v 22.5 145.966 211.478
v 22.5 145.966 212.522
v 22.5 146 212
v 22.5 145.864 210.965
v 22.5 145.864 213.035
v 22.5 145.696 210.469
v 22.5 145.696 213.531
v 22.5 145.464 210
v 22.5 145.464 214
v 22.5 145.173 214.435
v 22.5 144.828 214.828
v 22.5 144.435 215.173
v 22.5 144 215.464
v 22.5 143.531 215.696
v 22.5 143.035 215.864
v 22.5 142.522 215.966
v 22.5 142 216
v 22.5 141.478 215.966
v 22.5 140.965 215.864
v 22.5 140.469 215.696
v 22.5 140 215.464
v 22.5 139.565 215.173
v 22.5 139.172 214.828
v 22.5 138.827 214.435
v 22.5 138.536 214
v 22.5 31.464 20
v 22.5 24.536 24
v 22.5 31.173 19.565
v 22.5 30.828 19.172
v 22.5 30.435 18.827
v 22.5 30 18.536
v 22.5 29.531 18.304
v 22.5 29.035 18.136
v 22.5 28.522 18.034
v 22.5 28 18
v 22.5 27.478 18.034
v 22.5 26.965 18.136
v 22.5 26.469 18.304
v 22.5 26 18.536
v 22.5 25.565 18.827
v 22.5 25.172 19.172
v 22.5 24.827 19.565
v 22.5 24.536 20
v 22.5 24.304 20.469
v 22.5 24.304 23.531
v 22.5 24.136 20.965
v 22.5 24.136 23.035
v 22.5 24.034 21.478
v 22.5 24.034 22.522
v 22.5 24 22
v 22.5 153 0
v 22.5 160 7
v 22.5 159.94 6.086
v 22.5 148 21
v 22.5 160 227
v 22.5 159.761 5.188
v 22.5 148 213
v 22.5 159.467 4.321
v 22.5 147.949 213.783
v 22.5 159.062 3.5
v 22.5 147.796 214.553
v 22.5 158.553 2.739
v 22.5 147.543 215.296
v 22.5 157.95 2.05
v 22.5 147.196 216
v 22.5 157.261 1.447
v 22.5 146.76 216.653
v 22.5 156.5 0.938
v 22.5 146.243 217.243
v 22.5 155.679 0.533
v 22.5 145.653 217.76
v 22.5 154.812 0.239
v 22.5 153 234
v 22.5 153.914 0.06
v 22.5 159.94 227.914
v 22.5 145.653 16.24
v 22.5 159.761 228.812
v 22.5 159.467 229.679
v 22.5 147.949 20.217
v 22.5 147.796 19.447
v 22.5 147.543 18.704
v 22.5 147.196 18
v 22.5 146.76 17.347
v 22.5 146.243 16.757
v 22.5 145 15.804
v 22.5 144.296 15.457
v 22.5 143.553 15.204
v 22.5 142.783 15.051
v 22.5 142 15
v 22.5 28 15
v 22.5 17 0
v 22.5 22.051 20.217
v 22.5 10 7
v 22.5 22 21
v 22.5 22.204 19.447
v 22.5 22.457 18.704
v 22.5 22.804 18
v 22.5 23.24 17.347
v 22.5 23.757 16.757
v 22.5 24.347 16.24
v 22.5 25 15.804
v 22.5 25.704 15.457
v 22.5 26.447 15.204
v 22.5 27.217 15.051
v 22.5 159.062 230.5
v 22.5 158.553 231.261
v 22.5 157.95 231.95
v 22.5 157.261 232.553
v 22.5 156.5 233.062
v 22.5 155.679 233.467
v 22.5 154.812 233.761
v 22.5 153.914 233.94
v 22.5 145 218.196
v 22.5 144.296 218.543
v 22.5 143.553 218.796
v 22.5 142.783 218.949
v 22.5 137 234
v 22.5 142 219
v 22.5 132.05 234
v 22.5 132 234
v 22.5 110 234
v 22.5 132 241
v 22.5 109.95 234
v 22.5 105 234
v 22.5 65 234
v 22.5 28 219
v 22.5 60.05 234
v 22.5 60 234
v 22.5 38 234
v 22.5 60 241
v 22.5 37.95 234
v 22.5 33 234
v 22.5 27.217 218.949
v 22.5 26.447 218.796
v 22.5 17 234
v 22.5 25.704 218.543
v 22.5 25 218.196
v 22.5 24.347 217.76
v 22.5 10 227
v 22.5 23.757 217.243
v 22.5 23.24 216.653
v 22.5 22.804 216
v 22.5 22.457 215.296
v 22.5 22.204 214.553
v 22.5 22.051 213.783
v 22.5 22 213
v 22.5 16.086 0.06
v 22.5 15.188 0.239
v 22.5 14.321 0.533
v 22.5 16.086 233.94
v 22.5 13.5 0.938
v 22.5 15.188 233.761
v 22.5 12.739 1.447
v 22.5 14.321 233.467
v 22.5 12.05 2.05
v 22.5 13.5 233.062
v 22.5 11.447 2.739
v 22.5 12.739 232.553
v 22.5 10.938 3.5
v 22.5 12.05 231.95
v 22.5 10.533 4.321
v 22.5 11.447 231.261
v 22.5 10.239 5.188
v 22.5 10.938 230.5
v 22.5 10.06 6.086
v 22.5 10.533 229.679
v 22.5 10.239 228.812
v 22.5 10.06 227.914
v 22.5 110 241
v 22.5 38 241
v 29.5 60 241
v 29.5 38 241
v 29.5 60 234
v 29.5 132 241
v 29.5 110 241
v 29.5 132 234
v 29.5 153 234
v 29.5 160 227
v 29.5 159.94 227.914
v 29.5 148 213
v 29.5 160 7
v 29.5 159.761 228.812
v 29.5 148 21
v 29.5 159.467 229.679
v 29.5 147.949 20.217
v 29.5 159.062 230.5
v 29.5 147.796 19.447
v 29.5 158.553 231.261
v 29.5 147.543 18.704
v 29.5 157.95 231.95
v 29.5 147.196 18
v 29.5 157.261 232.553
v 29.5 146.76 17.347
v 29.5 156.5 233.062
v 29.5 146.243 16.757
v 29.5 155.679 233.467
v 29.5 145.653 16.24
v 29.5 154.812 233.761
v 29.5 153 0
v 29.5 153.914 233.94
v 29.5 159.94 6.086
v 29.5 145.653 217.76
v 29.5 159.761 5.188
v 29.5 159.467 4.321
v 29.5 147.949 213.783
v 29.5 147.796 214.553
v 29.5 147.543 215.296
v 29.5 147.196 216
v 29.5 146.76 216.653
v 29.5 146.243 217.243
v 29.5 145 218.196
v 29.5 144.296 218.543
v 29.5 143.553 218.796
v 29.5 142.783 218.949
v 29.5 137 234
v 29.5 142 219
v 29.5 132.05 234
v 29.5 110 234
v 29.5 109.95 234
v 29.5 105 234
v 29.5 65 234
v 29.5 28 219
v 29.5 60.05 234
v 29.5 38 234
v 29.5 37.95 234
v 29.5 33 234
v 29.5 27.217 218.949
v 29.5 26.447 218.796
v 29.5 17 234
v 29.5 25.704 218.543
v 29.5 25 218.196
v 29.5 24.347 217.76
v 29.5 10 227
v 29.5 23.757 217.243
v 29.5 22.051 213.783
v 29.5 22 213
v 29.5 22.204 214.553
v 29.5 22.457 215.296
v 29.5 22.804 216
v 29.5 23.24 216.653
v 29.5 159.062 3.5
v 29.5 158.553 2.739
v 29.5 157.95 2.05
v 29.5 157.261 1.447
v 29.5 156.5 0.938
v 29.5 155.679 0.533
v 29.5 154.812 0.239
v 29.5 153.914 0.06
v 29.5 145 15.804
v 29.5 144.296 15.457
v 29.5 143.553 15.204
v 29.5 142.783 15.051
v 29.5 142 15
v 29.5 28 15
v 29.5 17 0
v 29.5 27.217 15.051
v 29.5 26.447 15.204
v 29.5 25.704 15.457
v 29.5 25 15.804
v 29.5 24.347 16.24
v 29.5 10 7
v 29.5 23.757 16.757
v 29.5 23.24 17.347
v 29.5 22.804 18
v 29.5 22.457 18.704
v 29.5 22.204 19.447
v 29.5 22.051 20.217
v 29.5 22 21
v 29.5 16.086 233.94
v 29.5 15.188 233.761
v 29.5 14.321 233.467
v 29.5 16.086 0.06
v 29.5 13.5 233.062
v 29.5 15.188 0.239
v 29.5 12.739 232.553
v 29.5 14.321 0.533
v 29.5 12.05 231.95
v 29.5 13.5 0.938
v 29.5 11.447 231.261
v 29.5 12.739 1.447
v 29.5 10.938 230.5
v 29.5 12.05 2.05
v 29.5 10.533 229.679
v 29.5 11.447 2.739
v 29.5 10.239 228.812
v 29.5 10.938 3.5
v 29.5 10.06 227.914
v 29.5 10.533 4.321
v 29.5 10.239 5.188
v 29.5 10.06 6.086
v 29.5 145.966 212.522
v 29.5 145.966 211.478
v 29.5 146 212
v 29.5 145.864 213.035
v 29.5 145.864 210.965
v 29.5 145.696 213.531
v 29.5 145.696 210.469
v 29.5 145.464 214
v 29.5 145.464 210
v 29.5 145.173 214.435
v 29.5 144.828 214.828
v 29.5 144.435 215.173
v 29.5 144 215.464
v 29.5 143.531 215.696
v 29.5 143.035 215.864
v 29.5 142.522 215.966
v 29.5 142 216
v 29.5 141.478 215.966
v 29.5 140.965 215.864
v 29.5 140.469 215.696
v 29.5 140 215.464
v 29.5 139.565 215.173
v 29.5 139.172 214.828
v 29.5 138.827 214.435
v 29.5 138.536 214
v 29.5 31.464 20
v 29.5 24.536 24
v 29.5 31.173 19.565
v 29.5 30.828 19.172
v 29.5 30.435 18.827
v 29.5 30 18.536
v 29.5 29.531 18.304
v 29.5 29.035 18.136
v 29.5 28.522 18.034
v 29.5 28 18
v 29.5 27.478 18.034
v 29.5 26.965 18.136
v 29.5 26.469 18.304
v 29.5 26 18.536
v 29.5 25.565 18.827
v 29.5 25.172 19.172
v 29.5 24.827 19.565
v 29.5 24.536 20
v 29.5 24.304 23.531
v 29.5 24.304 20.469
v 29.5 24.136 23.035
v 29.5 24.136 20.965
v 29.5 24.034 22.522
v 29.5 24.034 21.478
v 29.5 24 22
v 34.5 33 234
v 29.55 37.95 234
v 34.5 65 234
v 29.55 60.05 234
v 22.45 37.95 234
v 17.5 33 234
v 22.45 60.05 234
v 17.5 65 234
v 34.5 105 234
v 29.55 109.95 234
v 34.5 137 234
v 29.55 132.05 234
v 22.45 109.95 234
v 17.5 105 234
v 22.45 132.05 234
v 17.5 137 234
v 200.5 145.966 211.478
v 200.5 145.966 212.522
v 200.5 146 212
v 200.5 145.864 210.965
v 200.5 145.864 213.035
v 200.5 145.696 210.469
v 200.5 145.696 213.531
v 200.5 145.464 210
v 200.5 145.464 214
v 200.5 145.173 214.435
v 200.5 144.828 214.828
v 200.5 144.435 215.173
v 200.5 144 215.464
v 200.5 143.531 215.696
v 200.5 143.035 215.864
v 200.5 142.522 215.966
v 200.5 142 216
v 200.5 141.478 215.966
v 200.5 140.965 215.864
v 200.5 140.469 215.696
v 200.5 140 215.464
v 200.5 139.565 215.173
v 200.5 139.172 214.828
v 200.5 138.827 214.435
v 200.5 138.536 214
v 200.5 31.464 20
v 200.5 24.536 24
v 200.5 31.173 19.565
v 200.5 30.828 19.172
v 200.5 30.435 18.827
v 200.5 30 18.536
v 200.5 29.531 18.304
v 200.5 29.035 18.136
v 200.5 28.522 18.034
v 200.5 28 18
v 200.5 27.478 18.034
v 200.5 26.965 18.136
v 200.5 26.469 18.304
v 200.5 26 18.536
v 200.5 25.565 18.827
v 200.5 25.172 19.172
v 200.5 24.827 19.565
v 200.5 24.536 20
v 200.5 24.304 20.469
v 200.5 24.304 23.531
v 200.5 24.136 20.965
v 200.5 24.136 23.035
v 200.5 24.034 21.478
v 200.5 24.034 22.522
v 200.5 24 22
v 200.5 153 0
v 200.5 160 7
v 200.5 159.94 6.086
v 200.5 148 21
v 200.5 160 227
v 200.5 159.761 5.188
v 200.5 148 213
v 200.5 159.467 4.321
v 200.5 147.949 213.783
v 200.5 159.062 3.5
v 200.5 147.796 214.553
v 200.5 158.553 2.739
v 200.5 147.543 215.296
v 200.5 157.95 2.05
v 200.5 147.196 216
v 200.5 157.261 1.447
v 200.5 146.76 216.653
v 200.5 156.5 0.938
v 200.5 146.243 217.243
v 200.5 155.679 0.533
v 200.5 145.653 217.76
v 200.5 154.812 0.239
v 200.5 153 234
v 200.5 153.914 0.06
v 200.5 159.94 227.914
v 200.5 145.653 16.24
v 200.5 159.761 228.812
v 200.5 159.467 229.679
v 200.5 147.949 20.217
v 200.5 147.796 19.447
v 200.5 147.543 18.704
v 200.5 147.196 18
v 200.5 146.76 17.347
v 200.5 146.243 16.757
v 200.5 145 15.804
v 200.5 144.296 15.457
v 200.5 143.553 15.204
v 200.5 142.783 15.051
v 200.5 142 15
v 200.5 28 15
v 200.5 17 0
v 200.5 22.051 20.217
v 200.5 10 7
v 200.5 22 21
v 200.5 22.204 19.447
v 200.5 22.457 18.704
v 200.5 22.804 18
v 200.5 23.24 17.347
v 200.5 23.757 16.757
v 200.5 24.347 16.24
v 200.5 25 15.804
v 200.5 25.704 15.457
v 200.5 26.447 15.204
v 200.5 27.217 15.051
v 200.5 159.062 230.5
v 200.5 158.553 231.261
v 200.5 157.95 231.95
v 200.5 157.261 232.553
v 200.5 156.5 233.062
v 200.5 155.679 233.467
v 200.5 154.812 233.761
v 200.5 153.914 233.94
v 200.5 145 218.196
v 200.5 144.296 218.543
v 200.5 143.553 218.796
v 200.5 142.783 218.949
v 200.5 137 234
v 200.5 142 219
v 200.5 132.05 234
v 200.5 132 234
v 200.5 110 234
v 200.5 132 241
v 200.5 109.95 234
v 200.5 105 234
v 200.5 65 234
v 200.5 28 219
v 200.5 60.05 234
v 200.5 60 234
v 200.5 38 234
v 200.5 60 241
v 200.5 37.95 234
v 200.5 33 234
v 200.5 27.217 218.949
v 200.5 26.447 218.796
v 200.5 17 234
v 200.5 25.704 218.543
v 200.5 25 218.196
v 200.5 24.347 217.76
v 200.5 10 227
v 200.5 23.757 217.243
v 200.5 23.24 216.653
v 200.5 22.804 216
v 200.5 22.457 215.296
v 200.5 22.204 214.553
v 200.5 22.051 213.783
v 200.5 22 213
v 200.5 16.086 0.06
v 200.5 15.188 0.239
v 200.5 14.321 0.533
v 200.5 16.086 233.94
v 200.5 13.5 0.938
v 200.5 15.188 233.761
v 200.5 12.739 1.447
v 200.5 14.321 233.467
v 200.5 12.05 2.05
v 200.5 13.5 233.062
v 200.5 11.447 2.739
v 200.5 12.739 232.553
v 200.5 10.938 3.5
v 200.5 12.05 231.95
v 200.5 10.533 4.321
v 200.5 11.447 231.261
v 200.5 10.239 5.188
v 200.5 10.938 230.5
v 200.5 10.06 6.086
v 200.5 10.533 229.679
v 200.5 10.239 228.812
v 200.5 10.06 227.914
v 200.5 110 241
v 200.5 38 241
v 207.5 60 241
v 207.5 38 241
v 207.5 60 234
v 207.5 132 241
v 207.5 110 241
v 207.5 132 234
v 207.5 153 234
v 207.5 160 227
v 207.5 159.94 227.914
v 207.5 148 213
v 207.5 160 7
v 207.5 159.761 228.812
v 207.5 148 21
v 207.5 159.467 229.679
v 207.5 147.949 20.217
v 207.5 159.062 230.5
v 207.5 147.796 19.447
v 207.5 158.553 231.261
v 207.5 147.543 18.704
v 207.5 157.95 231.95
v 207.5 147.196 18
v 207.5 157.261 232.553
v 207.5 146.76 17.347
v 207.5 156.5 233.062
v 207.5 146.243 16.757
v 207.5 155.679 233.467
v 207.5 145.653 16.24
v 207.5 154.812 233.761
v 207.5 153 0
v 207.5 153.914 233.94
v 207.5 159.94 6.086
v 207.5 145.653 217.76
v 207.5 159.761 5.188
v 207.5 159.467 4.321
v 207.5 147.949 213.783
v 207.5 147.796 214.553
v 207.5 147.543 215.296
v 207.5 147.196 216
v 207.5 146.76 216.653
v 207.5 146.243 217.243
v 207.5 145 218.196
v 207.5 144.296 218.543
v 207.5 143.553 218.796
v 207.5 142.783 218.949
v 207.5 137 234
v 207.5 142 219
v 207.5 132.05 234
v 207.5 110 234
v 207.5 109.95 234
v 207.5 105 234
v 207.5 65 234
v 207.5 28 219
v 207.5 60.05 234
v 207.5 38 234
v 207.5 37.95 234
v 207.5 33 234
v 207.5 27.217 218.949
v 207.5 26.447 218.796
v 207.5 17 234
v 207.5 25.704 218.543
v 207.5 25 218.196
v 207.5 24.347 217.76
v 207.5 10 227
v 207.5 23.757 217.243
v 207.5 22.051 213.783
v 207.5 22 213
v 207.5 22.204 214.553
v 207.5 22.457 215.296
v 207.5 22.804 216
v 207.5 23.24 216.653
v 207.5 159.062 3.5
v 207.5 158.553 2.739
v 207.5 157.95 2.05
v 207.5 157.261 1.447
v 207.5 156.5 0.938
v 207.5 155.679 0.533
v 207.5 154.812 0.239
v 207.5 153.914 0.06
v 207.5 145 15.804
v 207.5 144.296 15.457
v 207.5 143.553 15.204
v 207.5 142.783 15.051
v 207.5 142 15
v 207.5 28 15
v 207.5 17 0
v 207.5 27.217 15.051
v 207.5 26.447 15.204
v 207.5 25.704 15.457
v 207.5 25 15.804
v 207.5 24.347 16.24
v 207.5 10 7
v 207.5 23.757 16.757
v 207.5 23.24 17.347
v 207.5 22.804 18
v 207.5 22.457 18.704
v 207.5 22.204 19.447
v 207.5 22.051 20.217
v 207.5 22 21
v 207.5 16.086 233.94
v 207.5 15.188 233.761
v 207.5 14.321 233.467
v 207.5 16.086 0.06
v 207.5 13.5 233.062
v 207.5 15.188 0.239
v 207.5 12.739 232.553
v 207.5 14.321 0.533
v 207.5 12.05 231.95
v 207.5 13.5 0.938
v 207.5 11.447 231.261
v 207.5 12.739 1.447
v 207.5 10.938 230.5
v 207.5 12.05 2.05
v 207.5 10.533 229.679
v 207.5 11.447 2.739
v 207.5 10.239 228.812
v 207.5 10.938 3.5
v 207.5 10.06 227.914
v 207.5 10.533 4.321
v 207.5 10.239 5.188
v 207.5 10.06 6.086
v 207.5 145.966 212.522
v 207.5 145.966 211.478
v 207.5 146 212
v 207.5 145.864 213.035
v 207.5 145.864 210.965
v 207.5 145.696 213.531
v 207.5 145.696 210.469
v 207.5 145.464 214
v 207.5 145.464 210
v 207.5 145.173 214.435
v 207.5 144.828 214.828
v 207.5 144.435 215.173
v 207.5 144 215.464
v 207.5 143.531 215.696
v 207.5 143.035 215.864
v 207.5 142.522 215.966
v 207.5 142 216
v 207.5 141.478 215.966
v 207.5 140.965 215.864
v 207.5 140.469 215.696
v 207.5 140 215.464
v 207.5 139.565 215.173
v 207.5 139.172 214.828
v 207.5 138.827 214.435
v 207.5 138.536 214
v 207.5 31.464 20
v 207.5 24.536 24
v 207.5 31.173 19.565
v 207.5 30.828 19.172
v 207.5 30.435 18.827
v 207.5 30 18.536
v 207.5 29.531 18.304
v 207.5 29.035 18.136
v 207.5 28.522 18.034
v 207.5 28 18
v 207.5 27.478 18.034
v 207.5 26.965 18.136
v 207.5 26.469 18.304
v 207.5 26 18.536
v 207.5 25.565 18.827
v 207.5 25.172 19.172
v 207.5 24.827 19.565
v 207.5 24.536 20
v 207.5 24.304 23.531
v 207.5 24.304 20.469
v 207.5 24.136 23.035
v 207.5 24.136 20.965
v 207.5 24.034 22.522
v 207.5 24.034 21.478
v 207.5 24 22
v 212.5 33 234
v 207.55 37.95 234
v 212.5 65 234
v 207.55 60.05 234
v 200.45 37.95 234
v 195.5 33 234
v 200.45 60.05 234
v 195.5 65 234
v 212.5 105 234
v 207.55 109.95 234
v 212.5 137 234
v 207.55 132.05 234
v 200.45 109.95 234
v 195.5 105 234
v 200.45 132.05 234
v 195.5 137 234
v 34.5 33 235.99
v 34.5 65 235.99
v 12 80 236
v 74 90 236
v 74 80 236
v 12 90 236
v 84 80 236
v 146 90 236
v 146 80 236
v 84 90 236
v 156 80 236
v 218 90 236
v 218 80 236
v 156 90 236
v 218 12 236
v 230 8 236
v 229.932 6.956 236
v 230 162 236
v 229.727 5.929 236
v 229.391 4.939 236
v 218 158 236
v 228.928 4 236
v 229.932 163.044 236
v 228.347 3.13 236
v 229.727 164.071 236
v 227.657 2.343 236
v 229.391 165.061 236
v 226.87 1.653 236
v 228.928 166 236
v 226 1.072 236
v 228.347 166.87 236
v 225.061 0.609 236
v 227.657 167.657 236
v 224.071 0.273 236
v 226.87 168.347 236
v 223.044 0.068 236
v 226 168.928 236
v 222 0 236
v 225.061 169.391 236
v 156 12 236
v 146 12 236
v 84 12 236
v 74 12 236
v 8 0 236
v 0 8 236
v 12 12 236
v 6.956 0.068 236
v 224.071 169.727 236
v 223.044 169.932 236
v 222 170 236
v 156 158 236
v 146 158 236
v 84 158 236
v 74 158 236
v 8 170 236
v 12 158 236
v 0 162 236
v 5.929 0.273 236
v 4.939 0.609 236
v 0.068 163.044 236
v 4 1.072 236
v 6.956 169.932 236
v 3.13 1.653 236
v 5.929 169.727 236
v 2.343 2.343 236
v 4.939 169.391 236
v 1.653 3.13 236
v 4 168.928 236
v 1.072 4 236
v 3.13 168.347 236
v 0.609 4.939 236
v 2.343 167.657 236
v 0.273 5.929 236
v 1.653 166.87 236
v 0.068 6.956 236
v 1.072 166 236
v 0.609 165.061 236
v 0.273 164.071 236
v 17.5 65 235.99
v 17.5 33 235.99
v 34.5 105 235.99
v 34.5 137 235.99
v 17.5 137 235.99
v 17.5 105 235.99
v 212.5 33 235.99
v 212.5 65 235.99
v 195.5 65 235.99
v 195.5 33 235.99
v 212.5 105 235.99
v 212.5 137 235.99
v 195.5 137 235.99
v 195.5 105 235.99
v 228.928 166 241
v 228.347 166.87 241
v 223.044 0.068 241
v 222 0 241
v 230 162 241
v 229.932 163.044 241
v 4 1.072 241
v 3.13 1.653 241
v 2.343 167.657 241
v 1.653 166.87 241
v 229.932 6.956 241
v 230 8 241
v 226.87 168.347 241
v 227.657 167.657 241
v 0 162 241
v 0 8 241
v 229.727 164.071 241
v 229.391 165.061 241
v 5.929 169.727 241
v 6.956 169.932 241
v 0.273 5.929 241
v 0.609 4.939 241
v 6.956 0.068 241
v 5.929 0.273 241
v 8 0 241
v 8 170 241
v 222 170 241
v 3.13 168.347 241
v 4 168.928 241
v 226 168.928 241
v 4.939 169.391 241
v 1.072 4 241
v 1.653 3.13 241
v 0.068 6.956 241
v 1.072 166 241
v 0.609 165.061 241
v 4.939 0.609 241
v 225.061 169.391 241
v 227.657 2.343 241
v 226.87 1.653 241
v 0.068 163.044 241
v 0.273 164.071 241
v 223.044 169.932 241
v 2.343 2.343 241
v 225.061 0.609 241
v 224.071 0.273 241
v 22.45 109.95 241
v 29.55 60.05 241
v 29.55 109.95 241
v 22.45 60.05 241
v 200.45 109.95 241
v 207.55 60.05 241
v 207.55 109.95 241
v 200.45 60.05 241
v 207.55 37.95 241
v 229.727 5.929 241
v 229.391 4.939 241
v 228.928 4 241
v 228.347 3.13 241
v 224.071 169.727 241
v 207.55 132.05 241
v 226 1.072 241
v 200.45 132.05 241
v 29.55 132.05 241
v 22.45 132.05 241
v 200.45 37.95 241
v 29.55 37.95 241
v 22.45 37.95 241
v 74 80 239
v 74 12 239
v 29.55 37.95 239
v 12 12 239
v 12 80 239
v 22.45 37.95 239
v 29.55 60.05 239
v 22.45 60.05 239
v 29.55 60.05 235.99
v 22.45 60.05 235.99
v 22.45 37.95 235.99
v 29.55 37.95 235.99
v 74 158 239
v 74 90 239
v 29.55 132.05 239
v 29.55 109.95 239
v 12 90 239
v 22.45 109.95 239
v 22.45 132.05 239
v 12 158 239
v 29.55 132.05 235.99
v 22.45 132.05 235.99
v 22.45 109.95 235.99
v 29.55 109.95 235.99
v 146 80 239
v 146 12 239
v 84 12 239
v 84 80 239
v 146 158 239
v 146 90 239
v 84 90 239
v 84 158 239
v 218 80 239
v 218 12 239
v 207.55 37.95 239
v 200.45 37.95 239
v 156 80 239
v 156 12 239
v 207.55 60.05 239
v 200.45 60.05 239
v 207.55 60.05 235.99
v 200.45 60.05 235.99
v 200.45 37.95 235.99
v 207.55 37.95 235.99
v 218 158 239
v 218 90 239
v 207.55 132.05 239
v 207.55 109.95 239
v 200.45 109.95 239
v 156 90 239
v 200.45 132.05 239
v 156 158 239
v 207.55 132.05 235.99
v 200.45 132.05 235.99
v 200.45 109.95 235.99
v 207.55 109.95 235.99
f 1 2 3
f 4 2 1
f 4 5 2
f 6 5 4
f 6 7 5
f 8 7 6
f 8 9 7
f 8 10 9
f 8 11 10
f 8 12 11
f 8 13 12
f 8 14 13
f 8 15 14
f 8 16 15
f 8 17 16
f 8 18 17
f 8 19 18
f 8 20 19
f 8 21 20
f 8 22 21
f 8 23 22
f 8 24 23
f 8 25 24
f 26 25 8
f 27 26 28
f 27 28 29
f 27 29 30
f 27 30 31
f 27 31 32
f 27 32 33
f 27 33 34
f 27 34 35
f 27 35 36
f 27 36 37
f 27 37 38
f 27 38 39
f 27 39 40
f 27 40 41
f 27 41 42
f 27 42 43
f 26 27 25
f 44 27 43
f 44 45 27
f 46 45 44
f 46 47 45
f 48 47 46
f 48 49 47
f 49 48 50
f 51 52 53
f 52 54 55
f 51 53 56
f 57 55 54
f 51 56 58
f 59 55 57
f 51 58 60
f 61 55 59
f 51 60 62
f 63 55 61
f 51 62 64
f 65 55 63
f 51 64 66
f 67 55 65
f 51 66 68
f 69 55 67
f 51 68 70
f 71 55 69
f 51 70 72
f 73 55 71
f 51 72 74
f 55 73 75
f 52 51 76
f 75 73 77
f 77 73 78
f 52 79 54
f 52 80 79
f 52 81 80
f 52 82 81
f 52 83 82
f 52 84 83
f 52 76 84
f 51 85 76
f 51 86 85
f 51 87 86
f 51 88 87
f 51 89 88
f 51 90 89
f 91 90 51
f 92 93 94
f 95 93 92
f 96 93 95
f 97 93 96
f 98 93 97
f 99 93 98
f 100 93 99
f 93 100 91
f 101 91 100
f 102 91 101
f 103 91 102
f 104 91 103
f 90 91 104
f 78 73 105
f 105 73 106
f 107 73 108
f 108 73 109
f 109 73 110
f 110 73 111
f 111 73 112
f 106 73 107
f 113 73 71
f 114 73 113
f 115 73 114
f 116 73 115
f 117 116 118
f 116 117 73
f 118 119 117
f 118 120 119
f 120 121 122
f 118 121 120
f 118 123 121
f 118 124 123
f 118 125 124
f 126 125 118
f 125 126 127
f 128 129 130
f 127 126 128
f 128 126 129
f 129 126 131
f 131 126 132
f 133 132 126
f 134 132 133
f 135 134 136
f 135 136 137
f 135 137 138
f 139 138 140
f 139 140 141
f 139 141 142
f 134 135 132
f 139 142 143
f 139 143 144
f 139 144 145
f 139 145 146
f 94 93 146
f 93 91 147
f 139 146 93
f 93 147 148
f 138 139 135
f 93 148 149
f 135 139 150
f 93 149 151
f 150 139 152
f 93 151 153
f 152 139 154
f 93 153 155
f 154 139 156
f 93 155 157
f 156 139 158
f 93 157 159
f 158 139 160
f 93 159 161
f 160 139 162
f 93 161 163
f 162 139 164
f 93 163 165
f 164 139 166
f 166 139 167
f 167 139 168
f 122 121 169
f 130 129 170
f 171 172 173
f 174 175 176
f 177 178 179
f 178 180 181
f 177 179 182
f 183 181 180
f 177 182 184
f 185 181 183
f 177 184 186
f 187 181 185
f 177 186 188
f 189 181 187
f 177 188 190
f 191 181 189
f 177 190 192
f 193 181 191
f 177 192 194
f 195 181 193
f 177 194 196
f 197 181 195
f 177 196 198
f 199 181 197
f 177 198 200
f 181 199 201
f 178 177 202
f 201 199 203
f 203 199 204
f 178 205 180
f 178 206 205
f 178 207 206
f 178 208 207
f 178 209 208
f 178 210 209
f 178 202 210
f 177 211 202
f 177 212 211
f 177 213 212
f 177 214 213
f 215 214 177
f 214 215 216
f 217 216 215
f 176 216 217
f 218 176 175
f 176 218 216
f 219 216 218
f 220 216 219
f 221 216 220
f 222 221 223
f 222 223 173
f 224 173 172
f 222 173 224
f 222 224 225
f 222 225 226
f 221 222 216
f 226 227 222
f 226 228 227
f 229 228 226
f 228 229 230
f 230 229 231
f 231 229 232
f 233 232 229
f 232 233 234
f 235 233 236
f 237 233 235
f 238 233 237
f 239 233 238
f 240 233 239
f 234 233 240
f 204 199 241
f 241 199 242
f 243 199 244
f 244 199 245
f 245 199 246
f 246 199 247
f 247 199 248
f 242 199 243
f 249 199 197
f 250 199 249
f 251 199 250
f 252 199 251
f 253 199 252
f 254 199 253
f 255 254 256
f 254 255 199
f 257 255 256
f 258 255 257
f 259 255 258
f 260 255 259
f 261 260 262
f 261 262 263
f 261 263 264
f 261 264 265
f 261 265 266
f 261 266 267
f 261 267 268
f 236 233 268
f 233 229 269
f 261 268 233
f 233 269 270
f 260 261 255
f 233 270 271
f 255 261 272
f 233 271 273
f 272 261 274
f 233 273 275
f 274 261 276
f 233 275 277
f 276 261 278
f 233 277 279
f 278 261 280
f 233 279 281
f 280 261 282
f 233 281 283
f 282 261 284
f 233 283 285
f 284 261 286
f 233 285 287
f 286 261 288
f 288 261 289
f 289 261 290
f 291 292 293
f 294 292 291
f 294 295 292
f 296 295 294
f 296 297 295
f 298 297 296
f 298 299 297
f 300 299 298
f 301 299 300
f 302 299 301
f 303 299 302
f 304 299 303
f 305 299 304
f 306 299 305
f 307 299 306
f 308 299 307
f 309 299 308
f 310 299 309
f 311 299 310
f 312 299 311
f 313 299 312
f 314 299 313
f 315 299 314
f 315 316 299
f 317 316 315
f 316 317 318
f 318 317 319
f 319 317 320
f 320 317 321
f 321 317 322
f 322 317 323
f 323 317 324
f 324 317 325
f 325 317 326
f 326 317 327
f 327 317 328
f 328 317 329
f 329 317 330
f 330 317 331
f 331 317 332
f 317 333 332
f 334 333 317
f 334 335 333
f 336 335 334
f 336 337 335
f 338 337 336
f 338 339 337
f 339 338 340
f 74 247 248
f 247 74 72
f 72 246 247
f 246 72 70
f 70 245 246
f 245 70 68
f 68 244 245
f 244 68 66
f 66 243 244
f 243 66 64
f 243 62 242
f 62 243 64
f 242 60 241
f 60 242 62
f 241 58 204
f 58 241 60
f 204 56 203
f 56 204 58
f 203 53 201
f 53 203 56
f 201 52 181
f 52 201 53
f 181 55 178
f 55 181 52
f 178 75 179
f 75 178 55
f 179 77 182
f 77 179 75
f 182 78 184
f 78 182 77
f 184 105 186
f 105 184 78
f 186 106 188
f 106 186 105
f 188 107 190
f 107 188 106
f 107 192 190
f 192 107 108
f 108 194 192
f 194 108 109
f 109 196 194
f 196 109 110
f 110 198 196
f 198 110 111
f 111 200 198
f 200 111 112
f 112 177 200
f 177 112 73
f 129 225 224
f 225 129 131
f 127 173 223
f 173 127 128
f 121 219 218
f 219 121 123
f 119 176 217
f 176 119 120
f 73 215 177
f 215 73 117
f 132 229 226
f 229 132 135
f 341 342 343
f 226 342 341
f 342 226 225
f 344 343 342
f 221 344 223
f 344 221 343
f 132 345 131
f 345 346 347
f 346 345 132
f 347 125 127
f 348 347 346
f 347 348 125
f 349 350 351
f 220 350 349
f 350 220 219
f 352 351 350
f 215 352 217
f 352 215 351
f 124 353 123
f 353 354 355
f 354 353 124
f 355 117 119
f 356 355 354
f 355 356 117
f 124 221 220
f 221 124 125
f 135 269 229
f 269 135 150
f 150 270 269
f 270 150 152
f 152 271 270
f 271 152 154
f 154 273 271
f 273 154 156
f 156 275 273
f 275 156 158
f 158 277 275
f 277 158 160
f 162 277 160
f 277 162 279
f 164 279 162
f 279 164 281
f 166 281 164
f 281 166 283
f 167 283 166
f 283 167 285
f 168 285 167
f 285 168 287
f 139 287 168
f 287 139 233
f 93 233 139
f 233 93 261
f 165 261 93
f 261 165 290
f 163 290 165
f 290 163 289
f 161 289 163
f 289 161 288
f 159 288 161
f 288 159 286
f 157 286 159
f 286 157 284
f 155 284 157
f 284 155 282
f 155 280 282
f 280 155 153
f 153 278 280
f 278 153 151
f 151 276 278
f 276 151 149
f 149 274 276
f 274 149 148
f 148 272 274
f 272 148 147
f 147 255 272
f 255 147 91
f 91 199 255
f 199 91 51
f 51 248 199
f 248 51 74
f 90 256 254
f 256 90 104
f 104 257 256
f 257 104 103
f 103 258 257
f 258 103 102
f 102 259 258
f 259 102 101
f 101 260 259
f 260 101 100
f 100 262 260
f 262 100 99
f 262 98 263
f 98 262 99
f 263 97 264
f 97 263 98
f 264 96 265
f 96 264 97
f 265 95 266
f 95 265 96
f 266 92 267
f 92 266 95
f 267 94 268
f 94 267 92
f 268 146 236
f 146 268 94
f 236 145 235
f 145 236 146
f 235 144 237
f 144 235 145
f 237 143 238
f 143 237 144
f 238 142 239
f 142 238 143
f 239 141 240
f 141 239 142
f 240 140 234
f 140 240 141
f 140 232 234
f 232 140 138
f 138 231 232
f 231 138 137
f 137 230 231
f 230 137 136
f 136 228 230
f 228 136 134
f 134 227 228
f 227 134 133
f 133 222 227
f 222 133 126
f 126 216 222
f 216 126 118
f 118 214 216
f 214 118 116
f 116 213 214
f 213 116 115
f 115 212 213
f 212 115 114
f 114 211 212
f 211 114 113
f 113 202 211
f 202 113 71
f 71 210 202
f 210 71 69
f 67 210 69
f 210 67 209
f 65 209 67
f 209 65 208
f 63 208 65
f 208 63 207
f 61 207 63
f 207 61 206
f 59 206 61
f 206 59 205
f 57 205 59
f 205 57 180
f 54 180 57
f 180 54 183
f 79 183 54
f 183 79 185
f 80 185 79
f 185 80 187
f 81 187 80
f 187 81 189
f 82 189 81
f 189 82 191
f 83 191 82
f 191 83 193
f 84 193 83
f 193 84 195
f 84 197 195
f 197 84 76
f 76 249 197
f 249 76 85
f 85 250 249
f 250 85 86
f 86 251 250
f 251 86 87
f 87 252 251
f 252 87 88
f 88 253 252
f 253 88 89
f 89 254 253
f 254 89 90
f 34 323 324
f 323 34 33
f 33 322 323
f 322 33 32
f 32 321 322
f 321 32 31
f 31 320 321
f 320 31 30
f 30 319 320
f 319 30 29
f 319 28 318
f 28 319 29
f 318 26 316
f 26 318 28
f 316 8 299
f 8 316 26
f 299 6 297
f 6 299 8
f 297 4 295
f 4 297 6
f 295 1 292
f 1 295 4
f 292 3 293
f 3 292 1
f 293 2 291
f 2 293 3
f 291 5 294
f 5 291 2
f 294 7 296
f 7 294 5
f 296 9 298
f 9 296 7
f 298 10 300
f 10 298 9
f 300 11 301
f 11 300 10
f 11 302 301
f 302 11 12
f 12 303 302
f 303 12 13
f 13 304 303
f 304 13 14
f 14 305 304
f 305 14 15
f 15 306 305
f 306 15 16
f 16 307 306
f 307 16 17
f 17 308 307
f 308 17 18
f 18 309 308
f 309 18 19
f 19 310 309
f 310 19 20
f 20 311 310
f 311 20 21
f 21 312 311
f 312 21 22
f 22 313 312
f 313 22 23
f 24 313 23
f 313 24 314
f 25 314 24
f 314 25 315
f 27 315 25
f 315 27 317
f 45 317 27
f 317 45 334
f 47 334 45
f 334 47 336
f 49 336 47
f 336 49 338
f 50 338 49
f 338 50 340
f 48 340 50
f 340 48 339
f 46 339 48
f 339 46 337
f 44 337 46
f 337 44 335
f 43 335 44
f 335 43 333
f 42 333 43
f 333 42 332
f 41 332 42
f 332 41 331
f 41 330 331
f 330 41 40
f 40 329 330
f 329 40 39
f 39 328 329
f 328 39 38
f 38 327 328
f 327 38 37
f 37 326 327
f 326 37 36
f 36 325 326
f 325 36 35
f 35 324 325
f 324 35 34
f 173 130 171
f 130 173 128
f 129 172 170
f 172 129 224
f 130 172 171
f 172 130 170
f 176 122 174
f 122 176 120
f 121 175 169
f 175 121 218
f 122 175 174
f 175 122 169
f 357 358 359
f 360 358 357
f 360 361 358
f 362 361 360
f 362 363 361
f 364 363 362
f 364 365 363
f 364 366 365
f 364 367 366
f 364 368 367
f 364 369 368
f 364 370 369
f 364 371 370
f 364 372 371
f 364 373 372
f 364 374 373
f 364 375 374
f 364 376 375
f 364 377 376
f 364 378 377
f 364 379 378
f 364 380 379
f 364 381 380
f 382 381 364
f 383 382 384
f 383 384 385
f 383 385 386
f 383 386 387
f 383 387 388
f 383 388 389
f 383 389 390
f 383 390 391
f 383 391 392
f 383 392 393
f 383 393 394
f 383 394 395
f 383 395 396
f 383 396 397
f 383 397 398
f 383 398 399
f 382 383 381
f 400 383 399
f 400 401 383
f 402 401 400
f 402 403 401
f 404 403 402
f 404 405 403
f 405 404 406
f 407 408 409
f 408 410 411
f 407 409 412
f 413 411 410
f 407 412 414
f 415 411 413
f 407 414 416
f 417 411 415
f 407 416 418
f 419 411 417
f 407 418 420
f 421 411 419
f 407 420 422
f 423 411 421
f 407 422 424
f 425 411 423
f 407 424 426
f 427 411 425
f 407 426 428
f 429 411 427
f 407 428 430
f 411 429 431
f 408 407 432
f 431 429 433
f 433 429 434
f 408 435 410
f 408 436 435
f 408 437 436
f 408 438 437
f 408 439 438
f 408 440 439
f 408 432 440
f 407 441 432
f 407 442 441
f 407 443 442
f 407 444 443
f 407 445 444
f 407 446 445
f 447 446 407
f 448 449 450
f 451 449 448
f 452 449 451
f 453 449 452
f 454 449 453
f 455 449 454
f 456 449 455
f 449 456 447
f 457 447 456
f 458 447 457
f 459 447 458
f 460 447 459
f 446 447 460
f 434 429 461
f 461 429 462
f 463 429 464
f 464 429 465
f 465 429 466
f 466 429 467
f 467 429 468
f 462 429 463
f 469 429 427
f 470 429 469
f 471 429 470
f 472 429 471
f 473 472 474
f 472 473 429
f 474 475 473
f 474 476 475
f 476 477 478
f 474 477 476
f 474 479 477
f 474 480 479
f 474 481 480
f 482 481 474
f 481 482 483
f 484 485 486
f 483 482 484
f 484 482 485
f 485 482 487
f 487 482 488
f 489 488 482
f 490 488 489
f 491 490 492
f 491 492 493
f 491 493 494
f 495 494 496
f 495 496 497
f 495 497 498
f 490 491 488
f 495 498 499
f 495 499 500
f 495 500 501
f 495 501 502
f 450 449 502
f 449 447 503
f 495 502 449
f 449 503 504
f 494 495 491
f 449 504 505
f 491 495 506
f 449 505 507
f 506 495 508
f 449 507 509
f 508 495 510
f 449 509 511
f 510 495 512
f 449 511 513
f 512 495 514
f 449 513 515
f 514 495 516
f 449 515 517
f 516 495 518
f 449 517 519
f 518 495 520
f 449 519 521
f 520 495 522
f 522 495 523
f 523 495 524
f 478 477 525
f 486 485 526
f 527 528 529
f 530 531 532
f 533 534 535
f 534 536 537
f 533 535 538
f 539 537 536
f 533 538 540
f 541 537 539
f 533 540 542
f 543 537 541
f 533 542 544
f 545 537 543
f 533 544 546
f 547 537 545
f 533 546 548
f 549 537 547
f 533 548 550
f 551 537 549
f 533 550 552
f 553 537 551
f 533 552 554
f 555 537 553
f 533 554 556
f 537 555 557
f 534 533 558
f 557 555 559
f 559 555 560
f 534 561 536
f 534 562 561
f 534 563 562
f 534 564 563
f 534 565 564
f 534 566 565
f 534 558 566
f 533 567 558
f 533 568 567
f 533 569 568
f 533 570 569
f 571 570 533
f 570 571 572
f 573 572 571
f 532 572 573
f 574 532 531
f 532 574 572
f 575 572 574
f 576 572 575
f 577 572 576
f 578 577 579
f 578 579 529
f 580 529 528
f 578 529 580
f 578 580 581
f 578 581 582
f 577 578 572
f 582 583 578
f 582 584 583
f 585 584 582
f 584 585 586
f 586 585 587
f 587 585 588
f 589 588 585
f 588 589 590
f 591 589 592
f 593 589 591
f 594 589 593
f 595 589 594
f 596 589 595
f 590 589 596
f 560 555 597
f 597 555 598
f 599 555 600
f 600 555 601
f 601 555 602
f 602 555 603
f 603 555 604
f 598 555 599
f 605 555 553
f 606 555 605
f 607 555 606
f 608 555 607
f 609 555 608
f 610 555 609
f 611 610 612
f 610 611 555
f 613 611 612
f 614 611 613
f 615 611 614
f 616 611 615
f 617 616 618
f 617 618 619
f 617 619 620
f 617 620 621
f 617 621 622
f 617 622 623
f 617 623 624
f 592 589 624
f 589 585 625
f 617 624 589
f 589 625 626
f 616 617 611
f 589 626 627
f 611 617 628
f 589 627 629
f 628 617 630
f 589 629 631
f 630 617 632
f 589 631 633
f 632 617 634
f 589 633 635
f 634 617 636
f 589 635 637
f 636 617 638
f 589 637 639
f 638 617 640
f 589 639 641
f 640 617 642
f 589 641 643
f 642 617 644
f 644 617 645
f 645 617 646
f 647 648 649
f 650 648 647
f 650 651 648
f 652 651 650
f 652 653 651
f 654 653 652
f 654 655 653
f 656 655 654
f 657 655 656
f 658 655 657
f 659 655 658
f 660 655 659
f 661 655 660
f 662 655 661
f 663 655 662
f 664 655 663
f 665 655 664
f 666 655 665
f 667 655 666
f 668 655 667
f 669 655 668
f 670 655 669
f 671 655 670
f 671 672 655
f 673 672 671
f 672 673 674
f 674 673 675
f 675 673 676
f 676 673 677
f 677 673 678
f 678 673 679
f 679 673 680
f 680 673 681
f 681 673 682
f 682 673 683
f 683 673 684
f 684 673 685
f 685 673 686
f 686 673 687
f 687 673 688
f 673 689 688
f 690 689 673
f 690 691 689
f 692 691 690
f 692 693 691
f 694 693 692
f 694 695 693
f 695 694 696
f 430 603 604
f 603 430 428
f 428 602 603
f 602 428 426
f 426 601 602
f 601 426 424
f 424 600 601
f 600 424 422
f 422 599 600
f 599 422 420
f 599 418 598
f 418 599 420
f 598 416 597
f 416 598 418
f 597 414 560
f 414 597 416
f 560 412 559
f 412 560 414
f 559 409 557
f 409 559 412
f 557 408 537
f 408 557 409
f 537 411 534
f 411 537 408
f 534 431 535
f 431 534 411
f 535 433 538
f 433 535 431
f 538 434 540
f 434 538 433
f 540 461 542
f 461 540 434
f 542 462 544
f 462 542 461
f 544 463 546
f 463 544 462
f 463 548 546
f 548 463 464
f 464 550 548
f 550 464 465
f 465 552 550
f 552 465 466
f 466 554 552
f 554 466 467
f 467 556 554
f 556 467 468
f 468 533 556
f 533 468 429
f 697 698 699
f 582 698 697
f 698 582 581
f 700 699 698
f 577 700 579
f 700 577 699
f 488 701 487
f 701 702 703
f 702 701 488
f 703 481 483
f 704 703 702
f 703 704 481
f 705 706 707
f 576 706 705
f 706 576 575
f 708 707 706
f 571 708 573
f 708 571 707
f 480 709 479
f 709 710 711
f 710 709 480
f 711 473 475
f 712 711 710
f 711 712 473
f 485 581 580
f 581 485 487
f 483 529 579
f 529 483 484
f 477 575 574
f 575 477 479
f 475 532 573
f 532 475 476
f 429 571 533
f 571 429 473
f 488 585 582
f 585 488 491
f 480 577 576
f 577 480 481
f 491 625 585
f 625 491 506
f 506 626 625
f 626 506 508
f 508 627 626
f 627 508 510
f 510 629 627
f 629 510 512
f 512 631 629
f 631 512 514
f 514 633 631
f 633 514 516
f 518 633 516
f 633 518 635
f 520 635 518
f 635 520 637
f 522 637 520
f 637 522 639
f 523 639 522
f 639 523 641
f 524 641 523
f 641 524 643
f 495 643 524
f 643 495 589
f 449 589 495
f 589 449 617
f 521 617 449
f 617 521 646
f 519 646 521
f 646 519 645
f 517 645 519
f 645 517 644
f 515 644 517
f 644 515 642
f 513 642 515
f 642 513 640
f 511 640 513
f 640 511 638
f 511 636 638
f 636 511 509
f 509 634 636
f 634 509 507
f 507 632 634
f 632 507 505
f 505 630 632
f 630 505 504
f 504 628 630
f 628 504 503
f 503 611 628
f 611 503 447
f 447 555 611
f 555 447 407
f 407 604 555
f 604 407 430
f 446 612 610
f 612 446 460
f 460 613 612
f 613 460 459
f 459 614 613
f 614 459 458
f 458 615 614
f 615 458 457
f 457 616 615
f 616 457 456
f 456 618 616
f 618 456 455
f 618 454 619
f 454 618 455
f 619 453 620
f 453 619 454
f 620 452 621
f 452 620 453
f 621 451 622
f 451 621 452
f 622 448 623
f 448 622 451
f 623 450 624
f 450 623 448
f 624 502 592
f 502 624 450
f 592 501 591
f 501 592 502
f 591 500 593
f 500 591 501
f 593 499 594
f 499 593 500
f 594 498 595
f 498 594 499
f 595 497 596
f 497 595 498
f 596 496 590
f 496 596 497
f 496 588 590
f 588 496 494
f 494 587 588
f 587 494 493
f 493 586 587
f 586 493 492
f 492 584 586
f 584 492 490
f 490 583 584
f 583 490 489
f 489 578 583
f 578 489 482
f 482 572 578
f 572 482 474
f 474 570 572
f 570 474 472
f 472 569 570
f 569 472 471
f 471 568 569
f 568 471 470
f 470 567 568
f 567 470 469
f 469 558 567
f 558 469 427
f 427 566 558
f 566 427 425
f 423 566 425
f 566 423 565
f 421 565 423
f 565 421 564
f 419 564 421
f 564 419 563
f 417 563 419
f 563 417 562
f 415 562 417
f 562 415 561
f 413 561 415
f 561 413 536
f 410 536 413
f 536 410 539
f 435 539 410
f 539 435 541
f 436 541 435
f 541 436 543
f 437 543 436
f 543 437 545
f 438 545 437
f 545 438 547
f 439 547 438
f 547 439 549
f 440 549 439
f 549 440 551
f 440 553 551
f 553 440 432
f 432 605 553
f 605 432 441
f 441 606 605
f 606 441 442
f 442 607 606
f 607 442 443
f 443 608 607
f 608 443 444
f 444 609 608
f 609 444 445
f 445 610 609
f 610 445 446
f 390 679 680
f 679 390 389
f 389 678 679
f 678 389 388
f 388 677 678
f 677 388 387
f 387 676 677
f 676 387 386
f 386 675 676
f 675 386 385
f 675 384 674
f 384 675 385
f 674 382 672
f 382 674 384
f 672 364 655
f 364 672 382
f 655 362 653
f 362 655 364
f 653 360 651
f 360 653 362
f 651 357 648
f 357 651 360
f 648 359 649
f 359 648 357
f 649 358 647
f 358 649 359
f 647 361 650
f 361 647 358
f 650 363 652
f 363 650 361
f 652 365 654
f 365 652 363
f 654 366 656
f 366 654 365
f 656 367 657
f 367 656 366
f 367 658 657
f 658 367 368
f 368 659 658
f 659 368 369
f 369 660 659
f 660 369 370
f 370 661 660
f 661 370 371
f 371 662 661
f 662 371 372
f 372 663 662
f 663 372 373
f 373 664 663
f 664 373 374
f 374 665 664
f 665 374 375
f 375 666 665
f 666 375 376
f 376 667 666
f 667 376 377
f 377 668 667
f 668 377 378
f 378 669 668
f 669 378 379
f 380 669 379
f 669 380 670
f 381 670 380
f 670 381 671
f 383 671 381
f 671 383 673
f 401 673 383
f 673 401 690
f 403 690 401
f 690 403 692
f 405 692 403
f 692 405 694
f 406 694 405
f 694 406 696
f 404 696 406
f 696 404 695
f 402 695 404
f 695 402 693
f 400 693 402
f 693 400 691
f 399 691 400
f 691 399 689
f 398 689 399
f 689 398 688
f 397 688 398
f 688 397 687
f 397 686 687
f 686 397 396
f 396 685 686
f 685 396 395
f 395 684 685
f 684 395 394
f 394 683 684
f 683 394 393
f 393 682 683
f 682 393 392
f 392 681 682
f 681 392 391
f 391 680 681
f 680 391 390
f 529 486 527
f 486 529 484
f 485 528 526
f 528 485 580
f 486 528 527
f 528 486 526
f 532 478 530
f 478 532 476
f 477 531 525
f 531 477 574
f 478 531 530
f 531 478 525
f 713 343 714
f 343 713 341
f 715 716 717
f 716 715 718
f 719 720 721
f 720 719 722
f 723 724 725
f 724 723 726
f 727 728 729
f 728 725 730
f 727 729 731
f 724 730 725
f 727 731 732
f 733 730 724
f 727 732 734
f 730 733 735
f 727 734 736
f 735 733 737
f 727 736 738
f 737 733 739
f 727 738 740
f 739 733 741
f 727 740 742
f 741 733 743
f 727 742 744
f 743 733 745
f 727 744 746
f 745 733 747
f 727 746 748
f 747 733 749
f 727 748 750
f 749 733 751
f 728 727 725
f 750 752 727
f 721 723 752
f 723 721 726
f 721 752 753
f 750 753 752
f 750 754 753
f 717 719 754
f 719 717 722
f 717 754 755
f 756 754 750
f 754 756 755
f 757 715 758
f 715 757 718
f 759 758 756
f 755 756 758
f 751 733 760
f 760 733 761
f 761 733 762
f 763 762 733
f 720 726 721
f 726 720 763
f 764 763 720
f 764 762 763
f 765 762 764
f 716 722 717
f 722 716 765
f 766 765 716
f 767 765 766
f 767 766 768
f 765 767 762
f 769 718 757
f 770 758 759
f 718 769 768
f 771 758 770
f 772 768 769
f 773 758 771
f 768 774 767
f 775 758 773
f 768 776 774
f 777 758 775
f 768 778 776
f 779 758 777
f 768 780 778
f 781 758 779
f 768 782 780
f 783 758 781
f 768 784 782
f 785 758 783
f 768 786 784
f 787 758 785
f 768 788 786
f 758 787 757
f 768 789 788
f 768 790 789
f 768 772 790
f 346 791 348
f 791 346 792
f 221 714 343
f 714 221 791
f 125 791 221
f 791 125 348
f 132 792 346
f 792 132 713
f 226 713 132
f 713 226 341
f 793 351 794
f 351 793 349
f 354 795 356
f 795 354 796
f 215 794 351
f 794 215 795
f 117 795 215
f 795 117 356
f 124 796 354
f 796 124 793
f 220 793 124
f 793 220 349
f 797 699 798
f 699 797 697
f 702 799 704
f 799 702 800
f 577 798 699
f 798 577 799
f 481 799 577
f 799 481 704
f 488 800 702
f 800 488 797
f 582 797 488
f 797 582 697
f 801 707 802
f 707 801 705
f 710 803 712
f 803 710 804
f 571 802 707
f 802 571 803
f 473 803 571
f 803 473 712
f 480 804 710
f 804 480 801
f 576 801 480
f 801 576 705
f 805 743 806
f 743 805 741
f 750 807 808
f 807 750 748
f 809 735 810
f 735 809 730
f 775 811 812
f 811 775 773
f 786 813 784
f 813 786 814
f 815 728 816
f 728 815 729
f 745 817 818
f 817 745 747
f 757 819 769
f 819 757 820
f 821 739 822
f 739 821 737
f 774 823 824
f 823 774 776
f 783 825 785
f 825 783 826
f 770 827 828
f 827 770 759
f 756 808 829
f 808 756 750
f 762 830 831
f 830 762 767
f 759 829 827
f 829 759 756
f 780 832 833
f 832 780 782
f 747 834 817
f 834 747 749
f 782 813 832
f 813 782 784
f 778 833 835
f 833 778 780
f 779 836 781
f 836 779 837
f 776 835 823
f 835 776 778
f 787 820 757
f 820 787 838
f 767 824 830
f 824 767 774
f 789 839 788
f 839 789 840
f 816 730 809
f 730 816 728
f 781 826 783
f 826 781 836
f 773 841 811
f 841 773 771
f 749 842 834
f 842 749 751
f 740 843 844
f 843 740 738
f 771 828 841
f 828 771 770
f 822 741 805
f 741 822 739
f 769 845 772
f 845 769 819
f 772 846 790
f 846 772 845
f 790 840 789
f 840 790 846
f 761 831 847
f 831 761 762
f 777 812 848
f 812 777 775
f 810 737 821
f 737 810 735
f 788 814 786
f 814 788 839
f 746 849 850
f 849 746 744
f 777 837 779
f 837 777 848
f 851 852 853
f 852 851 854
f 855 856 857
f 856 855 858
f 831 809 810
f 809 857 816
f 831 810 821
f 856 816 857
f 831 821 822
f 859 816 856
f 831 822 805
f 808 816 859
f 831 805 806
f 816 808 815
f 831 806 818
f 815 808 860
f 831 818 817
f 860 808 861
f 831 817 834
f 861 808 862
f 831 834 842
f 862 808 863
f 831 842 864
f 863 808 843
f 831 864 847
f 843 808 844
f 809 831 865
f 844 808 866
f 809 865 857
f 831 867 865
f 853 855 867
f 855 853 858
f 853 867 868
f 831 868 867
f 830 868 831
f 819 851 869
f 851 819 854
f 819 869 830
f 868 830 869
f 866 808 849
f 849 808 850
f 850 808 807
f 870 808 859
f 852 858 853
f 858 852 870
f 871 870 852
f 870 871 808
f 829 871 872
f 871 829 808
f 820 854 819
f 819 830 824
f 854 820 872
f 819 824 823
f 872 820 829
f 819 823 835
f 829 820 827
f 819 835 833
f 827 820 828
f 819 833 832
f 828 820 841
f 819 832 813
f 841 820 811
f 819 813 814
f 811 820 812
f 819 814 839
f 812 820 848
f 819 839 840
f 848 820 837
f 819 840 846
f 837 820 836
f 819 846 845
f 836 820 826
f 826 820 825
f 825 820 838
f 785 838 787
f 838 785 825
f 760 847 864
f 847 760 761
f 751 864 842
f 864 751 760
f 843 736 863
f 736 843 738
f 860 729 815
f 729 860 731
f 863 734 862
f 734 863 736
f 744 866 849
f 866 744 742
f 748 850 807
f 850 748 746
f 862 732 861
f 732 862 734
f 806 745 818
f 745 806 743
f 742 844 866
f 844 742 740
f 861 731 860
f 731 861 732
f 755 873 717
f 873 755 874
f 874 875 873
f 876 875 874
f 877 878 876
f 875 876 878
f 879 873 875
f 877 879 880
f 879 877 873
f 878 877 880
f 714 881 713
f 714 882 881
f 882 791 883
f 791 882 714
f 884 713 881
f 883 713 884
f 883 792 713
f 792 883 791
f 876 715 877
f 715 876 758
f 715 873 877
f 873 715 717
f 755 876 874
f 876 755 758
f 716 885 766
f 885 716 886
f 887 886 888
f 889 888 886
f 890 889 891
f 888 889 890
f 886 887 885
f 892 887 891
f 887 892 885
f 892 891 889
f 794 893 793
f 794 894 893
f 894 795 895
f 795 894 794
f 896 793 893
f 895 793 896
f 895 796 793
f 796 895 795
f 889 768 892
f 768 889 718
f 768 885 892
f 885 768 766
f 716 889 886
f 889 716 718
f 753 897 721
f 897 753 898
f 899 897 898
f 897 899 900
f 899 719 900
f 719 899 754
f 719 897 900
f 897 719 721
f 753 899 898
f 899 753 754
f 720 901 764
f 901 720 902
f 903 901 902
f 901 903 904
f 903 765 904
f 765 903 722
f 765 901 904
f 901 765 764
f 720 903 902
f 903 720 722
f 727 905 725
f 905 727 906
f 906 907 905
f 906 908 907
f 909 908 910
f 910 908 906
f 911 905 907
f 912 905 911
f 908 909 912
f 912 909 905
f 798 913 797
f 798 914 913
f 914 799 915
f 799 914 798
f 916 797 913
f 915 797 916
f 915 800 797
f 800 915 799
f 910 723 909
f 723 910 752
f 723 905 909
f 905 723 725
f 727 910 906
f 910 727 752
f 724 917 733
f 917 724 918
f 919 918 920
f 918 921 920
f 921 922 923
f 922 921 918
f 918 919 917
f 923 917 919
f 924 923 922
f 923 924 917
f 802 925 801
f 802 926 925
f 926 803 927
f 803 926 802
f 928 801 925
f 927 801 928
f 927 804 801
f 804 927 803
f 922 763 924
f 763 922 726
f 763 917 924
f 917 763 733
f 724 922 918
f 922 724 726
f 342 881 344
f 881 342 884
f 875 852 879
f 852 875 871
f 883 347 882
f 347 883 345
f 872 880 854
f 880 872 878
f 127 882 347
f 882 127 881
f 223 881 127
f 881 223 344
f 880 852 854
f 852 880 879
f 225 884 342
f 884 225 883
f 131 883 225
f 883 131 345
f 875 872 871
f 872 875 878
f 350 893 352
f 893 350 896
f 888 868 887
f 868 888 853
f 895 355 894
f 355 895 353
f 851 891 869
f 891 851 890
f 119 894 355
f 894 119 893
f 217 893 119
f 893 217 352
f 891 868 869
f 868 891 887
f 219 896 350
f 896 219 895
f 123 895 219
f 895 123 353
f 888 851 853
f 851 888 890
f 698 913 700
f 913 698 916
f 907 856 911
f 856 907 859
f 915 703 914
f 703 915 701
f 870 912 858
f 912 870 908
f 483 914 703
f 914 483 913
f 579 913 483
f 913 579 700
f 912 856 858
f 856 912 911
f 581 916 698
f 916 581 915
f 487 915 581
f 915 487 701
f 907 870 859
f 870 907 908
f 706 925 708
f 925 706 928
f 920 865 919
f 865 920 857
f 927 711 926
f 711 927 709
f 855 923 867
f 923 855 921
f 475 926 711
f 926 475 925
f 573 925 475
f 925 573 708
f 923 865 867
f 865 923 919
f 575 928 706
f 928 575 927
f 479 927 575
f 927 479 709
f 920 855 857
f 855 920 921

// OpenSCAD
// Flat-pack Footrest V3 — calibrated from physical fit tests
// Overall height: 241 mm
// Nominal tab: 7.00 x 22.00 mm
// Tested winning socket: 7.10 x 22.10 mm (+0.10 mm total)
// Intended use: seated footrest, not a step stool.

$fn=48;
part = "assembly"; // "top", "support", "assembly"

top_x = 230;
top_y = 170;
top_skin_t = 5;       // visible platform thickness
boss_extra = 2;       // bosses extend 2 mm below platform
engagement = 7;       // total socket depth = 5 + 2
overall_h = 241;
support_body_h = overall_h - engagement; // 234 mm

support_span_y = 150;
support_t = 7;

tab_t = 7;
tab_w = 22;
tab_h = 7;

slot_t = 7.10;
slot_w = 22.10;

support_x1 = 26;
support_x2 = top_x - 26;
support_y0 = 10;

// Slot centers along Y. Support tabs are placed to match these exactly.
slot_cy1 = 49;
slot_cy2 = 121;
local_tab_c1 = slot_cy1 - support_y0; // 39
local_tab_c2 = slot_cy2 - support_y0; // 111

module rr2d(x,y,r){
    offset(r=r) offset(delta=-r) square([x,y]);
}

module beam2d(x1,y1,x2,y2,w){
    hull(){
        translate([x1,y1]) circle(d=w);
        translate([x2,y2]) circle(d=w);
    }
}

module support_2d(){
    union(){
        // 12 mm perimeter frame
        difference(){
            rr2d(support_span_y, support_body_h, 7);
            translate([12,15])
                rr2d(support_span_y-24, support_body_h-30, 6);
        }
        // One diagonal brace to resist in-plane racking without much material.
        beam2d(18,22,support_span_y-18,support_body_h-22,8);
    }
}

module side_support(){
    union(){
        linear_extrude(support_t) support_2d();

        // Two calibrated tabs.
        translate([local_tab_c1-tab_w/2, support_body_h, 0])
            cube([tab_w, tab_h, tab_t]);
        translate([local_tab_c2-tab_w/2, support_body_h, 0])
            cube([tab_w, tab_h, tab_t]);
    }
}

module top_raw(){
    // 5 mm platform.
    linear_extrude(top_skin_t) rr2d(top_x,top_y,8);

    // Local 2 mm bosses around each socket give 7 mm total engagement
    // without making the whole platform 7 mm thick.
    for (sx=[support_x1,support_x2])
        for (cy=[slot_cy1,slot_cy2])
            translate([sx-8.5, cy-16, -boss_extra])
                cube([17,32,boss_extra]);
}

module top_panel(){
    difference(){
        top_raw();

        // Underside lightening pockets: leave 2 mm top skin, 12 mm perimeter,
        // and ~10 mm ribs between six pockets.
        for (ix=[0:2])
            for (iy=[0:1])
                translate([12 + ix*72, 12 + iy*78, -0.01])
                    cube([62,68,3.01]);

        // Four sockets through boss + top: exactly 7 mm deep.
        for (sx=[support_x1,support_x2])
            for (cy=[slot_cy1,slot_cy2])
                translate([sx-slot_t/2, cy-slot_w/2, -boss_extra-0.01])
                    cube([slot_t,slot_w,engagement+0.02]);
    }
}

module assembly(){
    // Supports: local width -> global Y, local height -> global Z,
    // local thickness -> global X.
    translate([support_x1-support_t/2, support_y0, 0])
        rotate([90,0,90]) side_support();

    translate([support_x2-support_t/2, support_y0, 0])
        rotate([90,0,90]) side_support();

    // Bottom of bosses sits at z = 234; top surface at z = 241.
    translate([0,0,support_body_h+boss_extra])
        top_panel();
}

if (part=="top") top_panel();
else if (part=="support") side_support();
else assembly();
